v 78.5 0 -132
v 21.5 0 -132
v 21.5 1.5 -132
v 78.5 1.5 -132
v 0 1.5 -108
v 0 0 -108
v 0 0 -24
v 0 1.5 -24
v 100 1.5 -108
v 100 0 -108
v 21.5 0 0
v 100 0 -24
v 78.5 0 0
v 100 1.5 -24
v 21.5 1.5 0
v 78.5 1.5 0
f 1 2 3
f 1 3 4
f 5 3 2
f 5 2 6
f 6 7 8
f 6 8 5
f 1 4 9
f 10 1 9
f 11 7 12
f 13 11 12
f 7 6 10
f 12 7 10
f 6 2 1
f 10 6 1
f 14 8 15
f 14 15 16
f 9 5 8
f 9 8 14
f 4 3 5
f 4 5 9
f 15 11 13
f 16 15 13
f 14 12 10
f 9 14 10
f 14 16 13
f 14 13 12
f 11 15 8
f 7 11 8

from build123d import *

# Parameters (mm, degrees)
SKETCH1_W           = 100
SKETCH1_H           = 132
BOSS_EXTRUDE1_DEPTH = 1.5
CUT_EXTRUDE1_DEPTH  = 1.5


with BuildPart() as part:
    # Sketch1 → Boss-Extrude1 (new body)
    with BuildSketch(Plane(origin=(0, 0, 0), x_dir=(1, 0, 0), z_dir=(0, 1, 0))):
        with Locations((50, 66)):
            Rectangle(SKETCH1_W, SKETCH1_H)
    extrude(amount=BOSS_EXTRUDE1_DEPTH)

    # Sketch2 → Cut-Extrude1 (cut)
    with BuildSketch(Plane(origin=(0, 1.5, 0), x_dir=(1, 0, 0), z_dir=(0, 1, 0))):
        Polygon((78.5, 132), (100, 108), (126.790697674, 132), (105.290697674, 156), align=None)
        Polygon((-26.790697674, 132), (-5.290697674, 156), (21.5, 132), (0, 108), align=None)
        Polygon((126.790697674, 0), (105.290697674, -24), (78.5, 0), (100, 24), align=None)
        Polygon((0, 24), (-26.790697674, 0), (-5.290697674, -24), (21.5, 0), align=None)
    extrude(amount=-CUT_EXTRUDE1_DEPTH, mode=Mode.SUBTRACT)


solid = part.part
